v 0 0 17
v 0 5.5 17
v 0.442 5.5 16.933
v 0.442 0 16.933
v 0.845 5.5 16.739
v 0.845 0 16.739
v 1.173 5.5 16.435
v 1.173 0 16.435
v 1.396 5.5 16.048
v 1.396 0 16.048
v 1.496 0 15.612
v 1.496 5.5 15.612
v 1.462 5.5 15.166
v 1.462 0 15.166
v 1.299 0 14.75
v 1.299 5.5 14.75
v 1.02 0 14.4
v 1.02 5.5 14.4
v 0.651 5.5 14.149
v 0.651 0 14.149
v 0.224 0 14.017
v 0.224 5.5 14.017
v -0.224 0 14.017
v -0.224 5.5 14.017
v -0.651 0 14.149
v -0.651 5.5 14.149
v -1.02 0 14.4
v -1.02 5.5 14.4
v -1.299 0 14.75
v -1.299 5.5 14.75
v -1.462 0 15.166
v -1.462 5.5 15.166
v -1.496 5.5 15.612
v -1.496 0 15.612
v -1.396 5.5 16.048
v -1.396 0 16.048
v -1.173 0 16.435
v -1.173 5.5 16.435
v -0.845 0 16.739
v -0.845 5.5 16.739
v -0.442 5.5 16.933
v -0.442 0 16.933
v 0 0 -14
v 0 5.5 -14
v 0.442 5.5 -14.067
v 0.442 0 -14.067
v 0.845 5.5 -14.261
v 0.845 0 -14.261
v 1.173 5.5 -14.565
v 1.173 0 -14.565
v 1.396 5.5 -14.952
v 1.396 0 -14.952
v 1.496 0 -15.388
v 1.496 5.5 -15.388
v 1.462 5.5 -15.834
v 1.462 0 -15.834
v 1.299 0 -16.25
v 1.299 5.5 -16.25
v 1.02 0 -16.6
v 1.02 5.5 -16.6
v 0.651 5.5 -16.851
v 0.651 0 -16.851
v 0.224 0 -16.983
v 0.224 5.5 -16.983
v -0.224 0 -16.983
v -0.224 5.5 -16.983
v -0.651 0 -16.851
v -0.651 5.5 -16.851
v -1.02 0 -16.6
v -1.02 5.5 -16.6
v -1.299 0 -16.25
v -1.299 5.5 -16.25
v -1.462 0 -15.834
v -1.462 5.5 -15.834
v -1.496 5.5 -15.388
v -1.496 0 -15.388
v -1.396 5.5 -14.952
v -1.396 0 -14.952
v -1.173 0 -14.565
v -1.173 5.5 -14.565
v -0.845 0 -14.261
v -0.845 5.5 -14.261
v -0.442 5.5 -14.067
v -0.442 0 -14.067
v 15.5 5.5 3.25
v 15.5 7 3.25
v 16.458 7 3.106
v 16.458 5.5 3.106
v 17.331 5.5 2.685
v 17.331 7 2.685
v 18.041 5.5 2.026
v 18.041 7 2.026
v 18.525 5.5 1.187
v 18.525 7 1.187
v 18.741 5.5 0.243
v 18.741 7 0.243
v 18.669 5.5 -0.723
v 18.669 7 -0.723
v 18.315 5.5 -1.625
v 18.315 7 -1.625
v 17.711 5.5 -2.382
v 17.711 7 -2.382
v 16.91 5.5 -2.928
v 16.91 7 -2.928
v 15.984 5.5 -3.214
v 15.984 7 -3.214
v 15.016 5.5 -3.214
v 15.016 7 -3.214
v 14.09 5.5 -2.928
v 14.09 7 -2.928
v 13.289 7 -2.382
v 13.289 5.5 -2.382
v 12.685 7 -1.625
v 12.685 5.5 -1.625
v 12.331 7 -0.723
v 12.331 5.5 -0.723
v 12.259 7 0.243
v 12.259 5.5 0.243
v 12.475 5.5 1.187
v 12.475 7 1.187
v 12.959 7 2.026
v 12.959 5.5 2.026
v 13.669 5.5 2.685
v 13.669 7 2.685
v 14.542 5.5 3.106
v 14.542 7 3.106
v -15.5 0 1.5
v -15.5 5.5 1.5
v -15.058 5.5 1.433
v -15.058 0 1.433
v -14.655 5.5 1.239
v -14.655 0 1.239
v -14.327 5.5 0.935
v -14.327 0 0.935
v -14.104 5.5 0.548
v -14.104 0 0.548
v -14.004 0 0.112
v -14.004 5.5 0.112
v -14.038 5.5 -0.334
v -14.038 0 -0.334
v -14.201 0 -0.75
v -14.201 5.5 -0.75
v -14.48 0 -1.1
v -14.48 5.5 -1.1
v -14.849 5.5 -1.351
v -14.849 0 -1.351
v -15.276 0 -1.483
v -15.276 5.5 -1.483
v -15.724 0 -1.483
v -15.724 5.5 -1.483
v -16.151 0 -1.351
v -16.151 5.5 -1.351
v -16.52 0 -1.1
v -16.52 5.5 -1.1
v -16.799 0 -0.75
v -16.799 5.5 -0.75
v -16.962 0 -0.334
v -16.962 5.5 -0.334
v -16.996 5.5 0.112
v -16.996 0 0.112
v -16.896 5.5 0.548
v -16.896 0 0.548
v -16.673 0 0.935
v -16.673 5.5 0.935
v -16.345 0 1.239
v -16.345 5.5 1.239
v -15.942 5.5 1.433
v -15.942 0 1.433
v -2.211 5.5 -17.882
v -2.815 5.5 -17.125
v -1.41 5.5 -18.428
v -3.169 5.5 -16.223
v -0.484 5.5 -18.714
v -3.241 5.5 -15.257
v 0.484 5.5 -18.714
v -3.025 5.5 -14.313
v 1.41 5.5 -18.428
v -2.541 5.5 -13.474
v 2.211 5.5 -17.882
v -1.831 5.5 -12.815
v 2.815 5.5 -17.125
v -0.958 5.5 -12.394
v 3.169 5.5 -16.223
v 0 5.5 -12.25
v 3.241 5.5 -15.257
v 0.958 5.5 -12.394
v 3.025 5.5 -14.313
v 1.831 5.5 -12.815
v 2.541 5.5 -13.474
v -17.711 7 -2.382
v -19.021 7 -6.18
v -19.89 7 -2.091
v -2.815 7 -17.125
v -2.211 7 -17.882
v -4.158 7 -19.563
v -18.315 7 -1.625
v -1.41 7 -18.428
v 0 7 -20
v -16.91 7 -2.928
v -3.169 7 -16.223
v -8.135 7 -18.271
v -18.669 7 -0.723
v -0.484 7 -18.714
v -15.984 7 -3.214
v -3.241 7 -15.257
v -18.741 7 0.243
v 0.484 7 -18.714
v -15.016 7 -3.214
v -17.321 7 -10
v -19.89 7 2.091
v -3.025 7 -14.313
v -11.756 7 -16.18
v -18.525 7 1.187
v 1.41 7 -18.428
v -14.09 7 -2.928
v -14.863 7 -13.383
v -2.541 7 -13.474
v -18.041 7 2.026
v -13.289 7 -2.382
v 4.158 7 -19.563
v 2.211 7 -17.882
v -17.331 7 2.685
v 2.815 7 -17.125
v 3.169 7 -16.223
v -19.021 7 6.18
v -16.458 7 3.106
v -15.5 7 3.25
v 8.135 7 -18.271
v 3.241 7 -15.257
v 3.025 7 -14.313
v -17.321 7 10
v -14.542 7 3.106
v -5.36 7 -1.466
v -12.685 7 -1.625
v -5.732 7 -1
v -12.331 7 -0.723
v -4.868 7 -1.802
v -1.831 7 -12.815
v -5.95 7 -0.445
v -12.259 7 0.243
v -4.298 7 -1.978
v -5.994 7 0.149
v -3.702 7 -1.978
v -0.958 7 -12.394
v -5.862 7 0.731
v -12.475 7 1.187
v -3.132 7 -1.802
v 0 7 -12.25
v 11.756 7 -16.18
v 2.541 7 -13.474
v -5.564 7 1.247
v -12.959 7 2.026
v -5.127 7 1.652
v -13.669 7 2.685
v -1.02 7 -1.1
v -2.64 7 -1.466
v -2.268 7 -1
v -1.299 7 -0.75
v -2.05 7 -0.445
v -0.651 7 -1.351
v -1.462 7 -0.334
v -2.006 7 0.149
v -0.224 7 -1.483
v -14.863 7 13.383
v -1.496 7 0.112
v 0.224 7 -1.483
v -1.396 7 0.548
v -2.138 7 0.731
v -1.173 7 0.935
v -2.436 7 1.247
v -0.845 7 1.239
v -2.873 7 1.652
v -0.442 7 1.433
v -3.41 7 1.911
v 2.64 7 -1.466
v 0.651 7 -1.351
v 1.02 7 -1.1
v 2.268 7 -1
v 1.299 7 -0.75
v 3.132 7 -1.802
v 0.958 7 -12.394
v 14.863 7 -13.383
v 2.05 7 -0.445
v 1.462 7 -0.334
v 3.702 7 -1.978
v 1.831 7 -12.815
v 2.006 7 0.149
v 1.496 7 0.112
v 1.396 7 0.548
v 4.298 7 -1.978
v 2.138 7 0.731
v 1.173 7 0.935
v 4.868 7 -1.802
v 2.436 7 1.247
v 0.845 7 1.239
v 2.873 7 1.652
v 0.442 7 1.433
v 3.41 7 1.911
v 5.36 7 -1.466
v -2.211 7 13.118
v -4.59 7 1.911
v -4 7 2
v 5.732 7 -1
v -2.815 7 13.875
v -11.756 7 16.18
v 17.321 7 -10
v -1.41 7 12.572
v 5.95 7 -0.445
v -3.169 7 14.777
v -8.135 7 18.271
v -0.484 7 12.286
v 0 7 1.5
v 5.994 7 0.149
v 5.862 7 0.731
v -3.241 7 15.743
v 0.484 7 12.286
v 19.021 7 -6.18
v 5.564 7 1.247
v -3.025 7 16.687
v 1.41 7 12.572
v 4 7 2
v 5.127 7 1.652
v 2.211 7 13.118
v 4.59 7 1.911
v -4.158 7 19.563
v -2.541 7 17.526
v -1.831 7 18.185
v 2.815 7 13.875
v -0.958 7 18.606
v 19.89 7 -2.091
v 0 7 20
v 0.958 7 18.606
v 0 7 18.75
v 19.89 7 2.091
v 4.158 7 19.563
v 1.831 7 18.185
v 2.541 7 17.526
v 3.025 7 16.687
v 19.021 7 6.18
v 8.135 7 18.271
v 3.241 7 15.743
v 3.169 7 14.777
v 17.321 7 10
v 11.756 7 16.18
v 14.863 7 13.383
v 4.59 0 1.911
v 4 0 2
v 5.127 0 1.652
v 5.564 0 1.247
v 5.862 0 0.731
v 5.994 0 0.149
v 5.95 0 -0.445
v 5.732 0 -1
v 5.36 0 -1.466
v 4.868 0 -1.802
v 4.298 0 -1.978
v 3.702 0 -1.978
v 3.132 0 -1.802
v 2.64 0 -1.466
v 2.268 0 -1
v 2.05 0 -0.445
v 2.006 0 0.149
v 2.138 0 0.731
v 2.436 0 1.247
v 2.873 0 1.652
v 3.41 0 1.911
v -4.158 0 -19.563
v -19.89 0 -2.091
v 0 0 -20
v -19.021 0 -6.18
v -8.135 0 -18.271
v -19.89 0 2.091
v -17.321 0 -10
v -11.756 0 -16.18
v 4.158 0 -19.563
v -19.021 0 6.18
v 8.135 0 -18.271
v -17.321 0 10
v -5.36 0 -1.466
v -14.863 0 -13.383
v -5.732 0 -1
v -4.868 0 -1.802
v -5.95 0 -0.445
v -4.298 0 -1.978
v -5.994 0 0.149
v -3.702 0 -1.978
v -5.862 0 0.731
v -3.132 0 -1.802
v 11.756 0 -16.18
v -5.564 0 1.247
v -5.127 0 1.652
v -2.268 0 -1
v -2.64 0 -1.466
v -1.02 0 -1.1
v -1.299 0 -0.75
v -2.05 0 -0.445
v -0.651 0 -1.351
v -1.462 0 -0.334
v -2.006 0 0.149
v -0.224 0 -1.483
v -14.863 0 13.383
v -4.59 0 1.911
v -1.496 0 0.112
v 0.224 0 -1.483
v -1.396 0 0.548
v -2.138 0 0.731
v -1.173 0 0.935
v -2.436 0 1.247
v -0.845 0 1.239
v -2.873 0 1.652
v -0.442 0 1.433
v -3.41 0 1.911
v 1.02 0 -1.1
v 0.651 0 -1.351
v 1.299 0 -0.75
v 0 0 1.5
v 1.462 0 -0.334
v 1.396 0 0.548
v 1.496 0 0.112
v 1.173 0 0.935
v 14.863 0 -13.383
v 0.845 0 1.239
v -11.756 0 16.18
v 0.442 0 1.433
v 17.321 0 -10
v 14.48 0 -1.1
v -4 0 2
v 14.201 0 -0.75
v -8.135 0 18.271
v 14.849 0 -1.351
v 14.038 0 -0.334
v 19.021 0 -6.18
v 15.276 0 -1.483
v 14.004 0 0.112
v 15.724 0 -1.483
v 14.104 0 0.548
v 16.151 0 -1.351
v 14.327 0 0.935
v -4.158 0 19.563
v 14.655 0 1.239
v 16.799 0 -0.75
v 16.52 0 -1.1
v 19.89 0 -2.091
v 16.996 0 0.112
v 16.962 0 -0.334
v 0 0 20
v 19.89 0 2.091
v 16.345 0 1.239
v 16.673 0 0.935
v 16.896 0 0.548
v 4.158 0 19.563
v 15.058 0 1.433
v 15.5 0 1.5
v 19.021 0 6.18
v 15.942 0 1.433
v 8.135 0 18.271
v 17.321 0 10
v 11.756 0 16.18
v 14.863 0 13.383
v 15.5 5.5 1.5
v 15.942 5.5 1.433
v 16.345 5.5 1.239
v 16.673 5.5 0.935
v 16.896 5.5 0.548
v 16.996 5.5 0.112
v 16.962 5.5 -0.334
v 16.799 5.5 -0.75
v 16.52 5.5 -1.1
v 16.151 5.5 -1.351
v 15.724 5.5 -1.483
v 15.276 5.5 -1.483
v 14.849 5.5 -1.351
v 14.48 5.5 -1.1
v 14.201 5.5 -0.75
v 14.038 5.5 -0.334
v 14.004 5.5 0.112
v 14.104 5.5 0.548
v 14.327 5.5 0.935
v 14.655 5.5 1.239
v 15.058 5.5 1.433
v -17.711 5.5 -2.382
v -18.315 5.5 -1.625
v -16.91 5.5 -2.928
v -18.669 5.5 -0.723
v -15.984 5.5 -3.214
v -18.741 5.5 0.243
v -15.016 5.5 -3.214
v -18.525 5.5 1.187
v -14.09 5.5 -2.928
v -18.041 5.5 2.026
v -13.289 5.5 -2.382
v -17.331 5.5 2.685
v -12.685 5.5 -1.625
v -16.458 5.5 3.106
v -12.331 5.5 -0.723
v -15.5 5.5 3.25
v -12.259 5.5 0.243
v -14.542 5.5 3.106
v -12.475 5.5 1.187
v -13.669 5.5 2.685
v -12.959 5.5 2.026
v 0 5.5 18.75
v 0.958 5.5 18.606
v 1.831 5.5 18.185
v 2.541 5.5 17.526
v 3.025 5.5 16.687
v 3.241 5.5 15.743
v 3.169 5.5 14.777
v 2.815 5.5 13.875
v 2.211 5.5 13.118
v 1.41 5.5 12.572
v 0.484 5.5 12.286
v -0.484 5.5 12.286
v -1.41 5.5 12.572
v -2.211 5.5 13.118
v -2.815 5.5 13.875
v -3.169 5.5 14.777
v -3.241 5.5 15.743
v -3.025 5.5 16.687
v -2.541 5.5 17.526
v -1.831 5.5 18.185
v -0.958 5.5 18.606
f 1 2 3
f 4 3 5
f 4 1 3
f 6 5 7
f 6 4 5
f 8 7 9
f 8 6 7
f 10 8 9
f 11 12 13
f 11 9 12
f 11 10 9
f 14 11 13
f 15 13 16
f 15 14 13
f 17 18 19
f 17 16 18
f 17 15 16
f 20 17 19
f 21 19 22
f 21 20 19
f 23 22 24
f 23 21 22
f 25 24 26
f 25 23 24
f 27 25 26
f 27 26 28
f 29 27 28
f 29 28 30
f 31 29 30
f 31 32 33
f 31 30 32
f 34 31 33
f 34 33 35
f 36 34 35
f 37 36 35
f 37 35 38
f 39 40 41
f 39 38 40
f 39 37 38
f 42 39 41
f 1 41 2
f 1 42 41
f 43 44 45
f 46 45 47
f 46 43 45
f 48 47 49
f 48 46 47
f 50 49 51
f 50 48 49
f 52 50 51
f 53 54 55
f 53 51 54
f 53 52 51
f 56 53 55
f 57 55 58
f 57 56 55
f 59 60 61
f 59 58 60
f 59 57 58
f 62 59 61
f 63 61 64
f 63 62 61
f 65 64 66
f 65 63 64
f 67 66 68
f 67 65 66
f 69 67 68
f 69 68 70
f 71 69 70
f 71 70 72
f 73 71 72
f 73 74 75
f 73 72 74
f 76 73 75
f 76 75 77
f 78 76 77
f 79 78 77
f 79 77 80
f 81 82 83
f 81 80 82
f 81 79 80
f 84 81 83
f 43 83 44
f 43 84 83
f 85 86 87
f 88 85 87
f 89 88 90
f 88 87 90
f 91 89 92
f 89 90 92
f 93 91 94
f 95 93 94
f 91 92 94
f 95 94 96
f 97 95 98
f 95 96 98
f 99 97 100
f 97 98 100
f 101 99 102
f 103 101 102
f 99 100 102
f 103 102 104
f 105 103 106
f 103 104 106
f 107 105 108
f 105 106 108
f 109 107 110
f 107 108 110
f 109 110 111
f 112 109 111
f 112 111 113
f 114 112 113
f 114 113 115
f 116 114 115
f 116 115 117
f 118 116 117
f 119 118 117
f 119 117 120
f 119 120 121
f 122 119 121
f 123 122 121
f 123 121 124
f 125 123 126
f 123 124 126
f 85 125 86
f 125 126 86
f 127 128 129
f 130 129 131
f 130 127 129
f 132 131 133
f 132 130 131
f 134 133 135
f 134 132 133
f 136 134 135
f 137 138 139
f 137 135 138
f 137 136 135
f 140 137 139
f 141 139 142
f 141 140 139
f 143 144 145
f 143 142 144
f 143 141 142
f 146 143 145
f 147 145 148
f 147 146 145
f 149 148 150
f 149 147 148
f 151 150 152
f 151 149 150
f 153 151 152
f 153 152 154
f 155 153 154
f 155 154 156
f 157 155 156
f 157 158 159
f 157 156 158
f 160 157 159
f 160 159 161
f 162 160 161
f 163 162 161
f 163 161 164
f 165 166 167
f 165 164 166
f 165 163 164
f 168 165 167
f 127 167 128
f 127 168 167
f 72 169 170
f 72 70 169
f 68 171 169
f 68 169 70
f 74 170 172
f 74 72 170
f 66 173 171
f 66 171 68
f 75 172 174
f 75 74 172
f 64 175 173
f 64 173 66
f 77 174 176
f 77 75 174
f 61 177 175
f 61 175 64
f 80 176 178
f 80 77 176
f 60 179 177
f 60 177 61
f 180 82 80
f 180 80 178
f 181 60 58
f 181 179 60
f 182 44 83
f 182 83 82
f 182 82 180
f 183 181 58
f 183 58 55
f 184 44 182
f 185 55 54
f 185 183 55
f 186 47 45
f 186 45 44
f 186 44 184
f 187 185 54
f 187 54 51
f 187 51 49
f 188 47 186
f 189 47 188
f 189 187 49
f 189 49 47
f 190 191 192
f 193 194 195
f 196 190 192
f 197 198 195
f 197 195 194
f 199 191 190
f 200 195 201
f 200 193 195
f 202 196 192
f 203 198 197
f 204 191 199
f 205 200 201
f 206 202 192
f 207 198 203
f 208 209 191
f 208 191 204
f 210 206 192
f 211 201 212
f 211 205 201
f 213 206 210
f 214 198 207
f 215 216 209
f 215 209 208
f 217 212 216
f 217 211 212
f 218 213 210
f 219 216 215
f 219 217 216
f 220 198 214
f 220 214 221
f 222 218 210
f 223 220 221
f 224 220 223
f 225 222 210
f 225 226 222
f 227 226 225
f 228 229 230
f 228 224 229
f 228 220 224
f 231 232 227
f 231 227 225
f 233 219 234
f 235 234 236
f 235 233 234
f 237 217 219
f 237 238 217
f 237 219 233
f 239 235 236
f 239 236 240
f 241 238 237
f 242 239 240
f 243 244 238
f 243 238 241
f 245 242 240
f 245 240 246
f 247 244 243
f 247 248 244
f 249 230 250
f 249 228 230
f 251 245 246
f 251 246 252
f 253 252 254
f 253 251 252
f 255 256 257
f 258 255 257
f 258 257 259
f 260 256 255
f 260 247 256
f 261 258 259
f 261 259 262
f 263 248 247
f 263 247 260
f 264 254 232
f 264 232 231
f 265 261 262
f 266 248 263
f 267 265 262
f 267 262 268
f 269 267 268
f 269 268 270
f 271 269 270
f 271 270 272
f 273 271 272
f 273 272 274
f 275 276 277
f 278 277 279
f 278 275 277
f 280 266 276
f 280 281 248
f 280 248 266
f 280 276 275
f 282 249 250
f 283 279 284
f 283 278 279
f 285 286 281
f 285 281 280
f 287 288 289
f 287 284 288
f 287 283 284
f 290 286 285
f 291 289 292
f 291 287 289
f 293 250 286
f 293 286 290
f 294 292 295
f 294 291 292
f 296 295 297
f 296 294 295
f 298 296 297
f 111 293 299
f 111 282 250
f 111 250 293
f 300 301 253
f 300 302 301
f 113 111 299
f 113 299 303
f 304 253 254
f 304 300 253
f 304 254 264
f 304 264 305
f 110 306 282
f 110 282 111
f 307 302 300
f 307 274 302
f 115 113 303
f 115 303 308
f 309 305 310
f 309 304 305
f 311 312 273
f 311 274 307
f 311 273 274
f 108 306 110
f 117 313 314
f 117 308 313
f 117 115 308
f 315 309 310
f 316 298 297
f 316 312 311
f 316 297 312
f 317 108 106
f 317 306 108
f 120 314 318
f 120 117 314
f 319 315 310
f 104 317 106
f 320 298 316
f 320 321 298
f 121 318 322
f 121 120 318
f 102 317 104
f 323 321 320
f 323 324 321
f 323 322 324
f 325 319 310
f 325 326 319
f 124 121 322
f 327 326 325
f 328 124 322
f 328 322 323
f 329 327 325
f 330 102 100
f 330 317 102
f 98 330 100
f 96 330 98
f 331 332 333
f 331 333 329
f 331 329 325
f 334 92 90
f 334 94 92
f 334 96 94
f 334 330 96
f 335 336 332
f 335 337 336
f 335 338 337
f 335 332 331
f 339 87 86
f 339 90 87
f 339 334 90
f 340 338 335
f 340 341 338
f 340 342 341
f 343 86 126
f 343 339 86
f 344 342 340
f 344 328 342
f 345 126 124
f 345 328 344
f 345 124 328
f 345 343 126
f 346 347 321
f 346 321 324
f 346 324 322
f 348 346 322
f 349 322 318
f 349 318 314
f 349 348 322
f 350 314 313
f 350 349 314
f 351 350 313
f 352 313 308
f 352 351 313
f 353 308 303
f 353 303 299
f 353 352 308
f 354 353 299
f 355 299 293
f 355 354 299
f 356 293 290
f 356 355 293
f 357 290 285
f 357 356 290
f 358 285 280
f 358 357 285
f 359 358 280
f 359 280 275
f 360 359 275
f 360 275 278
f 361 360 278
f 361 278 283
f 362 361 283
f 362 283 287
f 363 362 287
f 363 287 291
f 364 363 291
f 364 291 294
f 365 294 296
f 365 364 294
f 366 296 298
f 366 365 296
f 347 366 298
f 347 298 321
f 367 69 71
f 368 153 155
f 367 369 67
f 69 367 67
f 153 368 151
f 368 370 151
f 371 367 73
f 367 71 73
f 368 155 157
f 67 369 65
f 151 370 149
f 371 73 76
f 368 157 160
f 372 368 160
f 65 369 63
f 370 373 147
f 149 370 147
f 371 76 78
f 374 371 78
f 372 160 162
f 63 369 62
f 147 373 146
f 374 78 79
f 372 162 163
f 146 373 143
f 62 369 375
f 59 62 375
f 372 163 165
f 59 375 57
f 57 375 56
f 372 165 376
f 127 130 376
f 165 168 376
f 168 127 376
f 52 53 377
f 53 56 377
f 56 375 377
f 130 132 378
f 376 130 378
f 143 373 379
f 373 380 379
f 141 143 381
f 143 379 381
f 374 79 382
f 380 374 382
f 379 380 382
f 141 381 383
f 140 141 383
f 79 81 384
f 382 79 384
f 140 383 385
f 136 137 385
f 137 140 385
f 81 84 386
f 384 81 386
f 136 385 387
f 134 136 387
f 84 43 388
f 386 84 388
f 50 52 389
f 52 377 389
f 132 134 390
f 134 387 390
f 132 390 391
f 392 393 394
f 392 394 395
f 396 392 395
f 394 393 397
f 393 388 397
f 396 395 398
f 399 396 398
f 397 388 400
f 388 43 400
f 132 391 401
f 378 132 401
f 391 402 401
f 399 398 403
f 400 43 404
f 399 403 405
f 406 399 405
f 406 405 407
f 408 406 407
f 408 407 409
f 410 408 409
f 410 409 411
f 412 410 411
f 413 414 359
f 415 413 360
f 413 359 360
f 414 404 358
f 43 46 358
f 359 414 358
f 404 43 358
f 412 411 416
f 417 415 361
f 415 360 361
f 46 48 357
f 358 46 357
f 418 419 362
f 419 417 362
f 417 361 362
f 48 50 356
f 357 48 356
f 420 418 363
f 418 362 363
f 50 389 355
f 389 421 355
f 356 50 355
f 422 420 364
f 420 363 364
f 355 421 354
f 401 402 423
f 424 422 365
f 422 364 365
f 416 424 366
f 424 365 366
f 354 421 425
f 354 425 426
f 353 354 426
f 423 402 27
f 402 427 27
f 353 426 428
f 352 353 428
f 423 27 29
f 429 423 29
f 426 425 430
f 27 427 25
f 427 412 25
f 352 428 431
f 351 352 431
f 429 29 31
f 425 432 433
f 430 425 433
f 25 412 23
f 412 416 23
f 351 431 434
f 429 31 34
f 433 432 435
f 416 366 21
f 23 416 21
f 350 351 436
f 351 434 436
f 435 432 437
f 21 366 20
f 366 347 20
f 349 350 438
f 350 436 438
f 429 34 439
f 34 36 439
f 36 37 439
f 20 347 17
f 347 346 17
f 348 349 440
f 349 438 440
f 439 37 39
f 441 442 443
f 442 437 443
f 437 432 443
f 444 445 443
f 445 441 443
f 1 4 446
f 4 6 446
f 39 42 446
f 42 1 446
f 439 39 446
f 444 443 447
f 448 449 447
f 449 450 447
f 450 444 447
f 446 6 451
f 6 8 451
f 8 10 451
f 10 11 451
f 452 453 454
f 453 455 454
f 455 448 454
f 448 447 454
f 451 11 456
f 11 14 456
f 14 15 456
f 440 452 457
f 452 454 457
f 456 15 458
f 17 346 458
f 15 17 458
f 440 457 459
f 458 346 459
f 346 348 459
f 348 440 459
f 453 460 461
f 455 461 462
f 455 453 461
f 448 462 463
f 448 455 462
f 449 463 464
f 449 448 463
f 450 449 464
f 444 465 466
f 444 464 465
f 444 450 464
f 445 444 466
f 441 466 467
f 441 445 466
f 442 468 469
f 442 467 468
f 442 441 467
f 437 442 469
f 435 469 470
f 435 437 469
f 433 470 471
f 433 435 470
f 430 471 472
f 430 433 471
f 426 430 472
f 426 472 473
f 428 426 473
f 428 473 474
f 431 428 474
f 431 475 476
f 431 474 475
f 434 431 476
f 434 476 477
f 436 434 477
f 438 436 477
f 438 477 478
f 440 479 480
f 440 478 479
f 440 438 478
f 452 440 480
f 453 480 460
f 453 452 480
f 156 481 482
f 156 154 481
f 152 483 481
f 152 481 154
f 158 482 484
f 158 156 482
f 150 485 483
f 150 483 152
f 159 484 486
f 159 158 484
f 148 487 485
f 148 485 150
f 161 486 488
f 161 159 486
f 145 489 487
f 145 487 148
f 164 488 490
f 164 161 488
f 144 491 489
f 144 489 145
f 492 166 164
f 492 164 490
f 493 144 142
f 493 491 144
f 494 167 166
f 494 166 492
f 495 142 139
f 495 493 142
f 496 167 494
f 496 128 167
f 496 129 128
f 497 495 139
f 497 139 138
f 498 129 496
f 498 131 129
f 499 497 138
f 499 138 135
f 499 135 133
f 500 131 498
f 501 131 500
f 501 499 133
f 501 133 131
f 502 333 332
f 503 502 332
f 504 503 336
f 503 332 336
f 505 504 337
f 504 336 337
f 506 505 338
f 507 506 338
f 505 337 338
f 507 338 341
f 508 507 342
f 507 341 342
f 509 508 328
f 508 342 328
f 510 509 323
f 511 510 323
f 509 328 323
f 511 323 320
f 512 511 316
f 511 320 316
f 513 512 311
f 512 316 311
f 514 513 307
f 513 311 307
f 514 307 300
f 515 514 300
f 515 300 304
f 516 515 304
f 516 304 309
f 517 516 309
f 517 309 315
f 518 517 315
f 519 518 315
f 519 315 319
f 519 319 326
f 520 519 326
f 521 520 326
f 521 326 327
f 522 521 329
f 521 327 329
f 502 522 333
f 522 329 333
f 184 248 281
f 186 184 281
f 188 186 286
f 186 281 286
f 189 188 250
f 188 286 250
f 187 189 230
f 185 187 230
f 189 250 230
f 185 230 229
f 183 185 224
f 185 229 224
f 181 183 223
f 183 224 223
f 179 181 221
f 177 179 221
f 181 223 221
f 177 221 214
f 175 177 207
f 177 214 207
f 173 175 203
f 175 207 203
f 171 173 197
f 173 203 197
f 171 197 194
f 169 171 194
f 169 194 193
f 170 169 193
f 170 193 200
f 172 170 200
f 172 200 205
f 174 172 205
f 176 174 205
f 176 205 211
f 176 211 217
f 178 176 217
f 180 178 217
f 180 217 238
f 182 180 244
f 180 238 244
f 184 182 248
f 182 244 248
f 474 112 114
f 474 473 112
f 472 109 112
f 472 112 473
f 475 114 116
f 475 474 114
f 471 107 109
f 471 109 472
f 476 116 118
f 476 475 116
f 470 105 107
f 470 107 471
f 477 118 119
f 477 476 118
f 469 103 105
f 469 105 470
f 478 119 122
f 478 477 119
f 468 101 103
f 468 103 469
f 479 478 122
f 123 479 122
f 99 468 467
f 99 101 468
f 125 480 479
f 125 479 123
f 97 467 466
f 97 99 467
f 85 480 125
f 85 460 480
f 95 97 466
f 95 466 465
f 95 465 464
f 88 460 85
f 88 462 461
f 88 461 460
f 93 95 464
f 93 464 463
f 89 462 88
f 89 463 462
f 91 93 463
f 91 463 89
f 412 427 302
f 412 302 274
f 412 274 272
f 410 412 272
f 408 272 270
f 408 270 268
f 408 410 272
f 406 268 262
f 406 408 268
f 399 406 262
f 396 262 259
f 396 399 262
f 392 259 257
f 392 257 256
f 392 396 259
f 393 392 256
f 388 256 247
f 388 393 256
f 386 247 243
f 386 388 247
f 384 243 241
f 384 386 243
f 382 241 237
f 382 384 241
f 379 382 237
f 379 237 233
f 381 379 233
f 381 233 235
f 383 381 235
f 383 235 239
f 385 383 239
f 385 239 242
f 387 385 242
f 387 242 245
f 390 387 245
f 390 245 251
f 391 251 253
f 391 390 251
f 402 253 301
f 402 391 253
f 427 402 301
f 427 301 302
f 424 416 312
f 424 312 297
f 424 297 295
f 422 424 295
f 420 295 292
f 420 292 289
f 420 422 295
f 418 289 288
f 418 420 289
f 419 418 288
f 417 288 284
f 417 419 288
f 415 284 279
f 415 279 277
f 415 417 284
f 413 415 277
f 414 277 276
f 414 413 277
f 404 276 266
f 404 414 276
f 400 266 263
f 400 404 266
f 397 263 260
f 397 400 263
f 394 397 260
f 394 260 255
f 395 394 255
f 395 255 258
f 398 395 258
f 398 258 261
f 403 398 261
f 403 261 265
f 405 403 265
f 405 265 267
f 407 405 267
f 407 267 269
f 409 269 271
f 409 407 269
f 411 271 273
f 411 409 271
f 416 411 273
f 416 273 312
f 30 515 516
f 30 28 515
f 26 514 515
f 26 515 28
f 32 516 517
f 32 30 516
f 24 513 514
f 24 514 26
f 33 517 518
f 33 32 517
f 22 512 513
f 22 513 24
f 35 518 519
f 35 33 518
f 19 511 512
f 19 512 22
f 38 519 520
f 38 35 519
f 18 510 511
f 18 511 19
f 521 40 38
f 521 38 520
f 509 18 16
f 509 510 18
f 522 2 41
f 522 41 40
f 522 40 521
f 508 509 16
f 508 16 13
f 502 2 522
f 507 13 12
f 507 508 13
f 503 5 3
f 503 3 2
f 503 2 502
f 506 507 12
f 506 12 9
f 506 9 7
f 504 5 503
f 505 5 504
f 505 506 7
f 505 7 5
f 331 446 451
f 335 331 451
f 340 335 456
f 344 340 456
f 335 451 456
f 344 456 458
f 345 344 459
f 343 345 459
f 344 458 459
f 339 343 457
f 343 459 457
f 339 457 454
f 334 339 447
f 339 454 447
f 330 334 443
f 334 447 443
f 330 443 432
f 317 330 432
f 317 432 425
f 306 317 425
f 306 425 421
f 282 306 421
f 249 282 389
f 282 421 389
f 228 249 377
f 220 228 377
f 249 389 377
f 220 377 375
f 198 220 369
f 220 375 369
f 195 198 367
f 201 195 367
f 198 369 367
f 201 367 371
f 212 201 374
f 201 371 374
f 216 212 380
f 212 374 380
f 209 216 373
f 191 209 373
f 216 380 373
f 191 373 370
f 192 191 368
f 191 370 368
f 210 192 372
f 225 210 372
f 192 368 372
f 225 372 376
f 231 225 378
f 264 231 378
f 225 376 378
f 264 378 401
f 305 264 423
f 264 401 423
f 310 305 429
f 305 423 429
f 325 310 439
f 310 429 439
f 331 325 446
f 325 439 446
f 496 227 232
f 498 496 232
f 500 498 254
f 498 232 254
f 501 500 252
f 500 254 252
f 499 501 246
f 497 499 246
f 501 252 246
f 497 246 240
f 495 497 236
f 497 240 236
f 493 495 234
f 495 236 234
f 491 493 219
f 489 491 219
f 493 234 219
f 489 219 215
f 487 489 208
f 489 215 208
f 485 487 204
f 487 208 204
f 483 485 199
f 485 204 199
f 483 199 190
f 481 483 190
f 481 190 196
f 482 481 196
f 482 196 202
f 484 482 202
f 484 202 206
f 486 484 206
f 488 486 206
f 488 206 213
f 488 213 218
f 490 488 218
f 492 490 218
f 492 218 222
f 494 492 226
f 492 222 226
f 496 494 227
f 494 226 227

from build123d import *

# Parameters (mm, degrees)
SKETCH1_R           = 20
SKETCH1_R_2         = 1.5
SKETCH1_R_3         = 2
BOSS_EXTRUDE1_DEPTH = 7
SKETCH2_R           = 3.25
CUT_EXTRUDE1_DEPTH  = 1.5


with BuildPart() as part:
    # Sketch1 → Boss-Extrude1 (new body)
    with BuildSketch(Plane(origin=(0, 0, 0), x_dir=(1, 0, 0), z_dir=(0, 1, 0))):
        with Locations(Location((0, 0, 0), (0, 0, 270))):
            Circle(SKETCH1_R)
        with Locations(Location((0, 15.5, 0), (0, 0, 270))):
            Circle(SKETCH1_R_2, mode=Mode.SUBTRACT)
        with Locations(Location((15.5, 0, 0), (0, 0, 270))):
            Circle(SKETCH1_R_2, mode=Mode.SUBTRACT)
        with Locations(Location((0, -15.5, 0), (0, 0, 270))):
            Circle(SKETCH1_R_2, mode=Mode.SUBTRACT)
        with Locations(Location((-15.5, 0, 0), (0, 0, 270))):
            Circle(SKETCH1_R_2, mode=Mode.SUBTRACT)
        with Locations(Location((-4, 0, 0), (0, 0, 270))):
            Circle(SKETCH1_R_3, mode=Mode.SUBTRACT)
        with Locations(Location((4, 0, 0), (0, 0, 270))):
            Circle(SKETCH1_R_3, mode=Mode.SUBTRACT)
        with Locations(Location((0, 0, 0), (0, 0, 270))):
            Circle(SKETCH1_R_2, mode=Mode.SUBTRACT)
    extrude(amount=BOSS_EXTRUDE1_DEPTH)

    # Sketch2 → Cut-Extrude1 (cut)
    with BuildSketch(Plane(origin=(0, 7, 0), x_dir=(1, 0, 0), z_dir=(0, 1, 0))):
        with Locations(Location((0, 15.5, 0), (0, 0, 270))):
            Circle(SKETCH2_R)
        with Locations(Location((15.5, 0, 0), (0, 0, 270))):
            Circle(SKETCH2_R)
        with Locations(Location((0, -15.5, 0), (0, 0, 270))):
            Circle(SKETCH2_R)
        with Locations(Location((-15.5, 0, 0), (0, 0, 270))):
            Circle(SKETCH2_R)
    extrude(amount=-CUT_EXTRUDE1_DEPTH, mode=Mode.SUBTRACT)


solid = part.part
